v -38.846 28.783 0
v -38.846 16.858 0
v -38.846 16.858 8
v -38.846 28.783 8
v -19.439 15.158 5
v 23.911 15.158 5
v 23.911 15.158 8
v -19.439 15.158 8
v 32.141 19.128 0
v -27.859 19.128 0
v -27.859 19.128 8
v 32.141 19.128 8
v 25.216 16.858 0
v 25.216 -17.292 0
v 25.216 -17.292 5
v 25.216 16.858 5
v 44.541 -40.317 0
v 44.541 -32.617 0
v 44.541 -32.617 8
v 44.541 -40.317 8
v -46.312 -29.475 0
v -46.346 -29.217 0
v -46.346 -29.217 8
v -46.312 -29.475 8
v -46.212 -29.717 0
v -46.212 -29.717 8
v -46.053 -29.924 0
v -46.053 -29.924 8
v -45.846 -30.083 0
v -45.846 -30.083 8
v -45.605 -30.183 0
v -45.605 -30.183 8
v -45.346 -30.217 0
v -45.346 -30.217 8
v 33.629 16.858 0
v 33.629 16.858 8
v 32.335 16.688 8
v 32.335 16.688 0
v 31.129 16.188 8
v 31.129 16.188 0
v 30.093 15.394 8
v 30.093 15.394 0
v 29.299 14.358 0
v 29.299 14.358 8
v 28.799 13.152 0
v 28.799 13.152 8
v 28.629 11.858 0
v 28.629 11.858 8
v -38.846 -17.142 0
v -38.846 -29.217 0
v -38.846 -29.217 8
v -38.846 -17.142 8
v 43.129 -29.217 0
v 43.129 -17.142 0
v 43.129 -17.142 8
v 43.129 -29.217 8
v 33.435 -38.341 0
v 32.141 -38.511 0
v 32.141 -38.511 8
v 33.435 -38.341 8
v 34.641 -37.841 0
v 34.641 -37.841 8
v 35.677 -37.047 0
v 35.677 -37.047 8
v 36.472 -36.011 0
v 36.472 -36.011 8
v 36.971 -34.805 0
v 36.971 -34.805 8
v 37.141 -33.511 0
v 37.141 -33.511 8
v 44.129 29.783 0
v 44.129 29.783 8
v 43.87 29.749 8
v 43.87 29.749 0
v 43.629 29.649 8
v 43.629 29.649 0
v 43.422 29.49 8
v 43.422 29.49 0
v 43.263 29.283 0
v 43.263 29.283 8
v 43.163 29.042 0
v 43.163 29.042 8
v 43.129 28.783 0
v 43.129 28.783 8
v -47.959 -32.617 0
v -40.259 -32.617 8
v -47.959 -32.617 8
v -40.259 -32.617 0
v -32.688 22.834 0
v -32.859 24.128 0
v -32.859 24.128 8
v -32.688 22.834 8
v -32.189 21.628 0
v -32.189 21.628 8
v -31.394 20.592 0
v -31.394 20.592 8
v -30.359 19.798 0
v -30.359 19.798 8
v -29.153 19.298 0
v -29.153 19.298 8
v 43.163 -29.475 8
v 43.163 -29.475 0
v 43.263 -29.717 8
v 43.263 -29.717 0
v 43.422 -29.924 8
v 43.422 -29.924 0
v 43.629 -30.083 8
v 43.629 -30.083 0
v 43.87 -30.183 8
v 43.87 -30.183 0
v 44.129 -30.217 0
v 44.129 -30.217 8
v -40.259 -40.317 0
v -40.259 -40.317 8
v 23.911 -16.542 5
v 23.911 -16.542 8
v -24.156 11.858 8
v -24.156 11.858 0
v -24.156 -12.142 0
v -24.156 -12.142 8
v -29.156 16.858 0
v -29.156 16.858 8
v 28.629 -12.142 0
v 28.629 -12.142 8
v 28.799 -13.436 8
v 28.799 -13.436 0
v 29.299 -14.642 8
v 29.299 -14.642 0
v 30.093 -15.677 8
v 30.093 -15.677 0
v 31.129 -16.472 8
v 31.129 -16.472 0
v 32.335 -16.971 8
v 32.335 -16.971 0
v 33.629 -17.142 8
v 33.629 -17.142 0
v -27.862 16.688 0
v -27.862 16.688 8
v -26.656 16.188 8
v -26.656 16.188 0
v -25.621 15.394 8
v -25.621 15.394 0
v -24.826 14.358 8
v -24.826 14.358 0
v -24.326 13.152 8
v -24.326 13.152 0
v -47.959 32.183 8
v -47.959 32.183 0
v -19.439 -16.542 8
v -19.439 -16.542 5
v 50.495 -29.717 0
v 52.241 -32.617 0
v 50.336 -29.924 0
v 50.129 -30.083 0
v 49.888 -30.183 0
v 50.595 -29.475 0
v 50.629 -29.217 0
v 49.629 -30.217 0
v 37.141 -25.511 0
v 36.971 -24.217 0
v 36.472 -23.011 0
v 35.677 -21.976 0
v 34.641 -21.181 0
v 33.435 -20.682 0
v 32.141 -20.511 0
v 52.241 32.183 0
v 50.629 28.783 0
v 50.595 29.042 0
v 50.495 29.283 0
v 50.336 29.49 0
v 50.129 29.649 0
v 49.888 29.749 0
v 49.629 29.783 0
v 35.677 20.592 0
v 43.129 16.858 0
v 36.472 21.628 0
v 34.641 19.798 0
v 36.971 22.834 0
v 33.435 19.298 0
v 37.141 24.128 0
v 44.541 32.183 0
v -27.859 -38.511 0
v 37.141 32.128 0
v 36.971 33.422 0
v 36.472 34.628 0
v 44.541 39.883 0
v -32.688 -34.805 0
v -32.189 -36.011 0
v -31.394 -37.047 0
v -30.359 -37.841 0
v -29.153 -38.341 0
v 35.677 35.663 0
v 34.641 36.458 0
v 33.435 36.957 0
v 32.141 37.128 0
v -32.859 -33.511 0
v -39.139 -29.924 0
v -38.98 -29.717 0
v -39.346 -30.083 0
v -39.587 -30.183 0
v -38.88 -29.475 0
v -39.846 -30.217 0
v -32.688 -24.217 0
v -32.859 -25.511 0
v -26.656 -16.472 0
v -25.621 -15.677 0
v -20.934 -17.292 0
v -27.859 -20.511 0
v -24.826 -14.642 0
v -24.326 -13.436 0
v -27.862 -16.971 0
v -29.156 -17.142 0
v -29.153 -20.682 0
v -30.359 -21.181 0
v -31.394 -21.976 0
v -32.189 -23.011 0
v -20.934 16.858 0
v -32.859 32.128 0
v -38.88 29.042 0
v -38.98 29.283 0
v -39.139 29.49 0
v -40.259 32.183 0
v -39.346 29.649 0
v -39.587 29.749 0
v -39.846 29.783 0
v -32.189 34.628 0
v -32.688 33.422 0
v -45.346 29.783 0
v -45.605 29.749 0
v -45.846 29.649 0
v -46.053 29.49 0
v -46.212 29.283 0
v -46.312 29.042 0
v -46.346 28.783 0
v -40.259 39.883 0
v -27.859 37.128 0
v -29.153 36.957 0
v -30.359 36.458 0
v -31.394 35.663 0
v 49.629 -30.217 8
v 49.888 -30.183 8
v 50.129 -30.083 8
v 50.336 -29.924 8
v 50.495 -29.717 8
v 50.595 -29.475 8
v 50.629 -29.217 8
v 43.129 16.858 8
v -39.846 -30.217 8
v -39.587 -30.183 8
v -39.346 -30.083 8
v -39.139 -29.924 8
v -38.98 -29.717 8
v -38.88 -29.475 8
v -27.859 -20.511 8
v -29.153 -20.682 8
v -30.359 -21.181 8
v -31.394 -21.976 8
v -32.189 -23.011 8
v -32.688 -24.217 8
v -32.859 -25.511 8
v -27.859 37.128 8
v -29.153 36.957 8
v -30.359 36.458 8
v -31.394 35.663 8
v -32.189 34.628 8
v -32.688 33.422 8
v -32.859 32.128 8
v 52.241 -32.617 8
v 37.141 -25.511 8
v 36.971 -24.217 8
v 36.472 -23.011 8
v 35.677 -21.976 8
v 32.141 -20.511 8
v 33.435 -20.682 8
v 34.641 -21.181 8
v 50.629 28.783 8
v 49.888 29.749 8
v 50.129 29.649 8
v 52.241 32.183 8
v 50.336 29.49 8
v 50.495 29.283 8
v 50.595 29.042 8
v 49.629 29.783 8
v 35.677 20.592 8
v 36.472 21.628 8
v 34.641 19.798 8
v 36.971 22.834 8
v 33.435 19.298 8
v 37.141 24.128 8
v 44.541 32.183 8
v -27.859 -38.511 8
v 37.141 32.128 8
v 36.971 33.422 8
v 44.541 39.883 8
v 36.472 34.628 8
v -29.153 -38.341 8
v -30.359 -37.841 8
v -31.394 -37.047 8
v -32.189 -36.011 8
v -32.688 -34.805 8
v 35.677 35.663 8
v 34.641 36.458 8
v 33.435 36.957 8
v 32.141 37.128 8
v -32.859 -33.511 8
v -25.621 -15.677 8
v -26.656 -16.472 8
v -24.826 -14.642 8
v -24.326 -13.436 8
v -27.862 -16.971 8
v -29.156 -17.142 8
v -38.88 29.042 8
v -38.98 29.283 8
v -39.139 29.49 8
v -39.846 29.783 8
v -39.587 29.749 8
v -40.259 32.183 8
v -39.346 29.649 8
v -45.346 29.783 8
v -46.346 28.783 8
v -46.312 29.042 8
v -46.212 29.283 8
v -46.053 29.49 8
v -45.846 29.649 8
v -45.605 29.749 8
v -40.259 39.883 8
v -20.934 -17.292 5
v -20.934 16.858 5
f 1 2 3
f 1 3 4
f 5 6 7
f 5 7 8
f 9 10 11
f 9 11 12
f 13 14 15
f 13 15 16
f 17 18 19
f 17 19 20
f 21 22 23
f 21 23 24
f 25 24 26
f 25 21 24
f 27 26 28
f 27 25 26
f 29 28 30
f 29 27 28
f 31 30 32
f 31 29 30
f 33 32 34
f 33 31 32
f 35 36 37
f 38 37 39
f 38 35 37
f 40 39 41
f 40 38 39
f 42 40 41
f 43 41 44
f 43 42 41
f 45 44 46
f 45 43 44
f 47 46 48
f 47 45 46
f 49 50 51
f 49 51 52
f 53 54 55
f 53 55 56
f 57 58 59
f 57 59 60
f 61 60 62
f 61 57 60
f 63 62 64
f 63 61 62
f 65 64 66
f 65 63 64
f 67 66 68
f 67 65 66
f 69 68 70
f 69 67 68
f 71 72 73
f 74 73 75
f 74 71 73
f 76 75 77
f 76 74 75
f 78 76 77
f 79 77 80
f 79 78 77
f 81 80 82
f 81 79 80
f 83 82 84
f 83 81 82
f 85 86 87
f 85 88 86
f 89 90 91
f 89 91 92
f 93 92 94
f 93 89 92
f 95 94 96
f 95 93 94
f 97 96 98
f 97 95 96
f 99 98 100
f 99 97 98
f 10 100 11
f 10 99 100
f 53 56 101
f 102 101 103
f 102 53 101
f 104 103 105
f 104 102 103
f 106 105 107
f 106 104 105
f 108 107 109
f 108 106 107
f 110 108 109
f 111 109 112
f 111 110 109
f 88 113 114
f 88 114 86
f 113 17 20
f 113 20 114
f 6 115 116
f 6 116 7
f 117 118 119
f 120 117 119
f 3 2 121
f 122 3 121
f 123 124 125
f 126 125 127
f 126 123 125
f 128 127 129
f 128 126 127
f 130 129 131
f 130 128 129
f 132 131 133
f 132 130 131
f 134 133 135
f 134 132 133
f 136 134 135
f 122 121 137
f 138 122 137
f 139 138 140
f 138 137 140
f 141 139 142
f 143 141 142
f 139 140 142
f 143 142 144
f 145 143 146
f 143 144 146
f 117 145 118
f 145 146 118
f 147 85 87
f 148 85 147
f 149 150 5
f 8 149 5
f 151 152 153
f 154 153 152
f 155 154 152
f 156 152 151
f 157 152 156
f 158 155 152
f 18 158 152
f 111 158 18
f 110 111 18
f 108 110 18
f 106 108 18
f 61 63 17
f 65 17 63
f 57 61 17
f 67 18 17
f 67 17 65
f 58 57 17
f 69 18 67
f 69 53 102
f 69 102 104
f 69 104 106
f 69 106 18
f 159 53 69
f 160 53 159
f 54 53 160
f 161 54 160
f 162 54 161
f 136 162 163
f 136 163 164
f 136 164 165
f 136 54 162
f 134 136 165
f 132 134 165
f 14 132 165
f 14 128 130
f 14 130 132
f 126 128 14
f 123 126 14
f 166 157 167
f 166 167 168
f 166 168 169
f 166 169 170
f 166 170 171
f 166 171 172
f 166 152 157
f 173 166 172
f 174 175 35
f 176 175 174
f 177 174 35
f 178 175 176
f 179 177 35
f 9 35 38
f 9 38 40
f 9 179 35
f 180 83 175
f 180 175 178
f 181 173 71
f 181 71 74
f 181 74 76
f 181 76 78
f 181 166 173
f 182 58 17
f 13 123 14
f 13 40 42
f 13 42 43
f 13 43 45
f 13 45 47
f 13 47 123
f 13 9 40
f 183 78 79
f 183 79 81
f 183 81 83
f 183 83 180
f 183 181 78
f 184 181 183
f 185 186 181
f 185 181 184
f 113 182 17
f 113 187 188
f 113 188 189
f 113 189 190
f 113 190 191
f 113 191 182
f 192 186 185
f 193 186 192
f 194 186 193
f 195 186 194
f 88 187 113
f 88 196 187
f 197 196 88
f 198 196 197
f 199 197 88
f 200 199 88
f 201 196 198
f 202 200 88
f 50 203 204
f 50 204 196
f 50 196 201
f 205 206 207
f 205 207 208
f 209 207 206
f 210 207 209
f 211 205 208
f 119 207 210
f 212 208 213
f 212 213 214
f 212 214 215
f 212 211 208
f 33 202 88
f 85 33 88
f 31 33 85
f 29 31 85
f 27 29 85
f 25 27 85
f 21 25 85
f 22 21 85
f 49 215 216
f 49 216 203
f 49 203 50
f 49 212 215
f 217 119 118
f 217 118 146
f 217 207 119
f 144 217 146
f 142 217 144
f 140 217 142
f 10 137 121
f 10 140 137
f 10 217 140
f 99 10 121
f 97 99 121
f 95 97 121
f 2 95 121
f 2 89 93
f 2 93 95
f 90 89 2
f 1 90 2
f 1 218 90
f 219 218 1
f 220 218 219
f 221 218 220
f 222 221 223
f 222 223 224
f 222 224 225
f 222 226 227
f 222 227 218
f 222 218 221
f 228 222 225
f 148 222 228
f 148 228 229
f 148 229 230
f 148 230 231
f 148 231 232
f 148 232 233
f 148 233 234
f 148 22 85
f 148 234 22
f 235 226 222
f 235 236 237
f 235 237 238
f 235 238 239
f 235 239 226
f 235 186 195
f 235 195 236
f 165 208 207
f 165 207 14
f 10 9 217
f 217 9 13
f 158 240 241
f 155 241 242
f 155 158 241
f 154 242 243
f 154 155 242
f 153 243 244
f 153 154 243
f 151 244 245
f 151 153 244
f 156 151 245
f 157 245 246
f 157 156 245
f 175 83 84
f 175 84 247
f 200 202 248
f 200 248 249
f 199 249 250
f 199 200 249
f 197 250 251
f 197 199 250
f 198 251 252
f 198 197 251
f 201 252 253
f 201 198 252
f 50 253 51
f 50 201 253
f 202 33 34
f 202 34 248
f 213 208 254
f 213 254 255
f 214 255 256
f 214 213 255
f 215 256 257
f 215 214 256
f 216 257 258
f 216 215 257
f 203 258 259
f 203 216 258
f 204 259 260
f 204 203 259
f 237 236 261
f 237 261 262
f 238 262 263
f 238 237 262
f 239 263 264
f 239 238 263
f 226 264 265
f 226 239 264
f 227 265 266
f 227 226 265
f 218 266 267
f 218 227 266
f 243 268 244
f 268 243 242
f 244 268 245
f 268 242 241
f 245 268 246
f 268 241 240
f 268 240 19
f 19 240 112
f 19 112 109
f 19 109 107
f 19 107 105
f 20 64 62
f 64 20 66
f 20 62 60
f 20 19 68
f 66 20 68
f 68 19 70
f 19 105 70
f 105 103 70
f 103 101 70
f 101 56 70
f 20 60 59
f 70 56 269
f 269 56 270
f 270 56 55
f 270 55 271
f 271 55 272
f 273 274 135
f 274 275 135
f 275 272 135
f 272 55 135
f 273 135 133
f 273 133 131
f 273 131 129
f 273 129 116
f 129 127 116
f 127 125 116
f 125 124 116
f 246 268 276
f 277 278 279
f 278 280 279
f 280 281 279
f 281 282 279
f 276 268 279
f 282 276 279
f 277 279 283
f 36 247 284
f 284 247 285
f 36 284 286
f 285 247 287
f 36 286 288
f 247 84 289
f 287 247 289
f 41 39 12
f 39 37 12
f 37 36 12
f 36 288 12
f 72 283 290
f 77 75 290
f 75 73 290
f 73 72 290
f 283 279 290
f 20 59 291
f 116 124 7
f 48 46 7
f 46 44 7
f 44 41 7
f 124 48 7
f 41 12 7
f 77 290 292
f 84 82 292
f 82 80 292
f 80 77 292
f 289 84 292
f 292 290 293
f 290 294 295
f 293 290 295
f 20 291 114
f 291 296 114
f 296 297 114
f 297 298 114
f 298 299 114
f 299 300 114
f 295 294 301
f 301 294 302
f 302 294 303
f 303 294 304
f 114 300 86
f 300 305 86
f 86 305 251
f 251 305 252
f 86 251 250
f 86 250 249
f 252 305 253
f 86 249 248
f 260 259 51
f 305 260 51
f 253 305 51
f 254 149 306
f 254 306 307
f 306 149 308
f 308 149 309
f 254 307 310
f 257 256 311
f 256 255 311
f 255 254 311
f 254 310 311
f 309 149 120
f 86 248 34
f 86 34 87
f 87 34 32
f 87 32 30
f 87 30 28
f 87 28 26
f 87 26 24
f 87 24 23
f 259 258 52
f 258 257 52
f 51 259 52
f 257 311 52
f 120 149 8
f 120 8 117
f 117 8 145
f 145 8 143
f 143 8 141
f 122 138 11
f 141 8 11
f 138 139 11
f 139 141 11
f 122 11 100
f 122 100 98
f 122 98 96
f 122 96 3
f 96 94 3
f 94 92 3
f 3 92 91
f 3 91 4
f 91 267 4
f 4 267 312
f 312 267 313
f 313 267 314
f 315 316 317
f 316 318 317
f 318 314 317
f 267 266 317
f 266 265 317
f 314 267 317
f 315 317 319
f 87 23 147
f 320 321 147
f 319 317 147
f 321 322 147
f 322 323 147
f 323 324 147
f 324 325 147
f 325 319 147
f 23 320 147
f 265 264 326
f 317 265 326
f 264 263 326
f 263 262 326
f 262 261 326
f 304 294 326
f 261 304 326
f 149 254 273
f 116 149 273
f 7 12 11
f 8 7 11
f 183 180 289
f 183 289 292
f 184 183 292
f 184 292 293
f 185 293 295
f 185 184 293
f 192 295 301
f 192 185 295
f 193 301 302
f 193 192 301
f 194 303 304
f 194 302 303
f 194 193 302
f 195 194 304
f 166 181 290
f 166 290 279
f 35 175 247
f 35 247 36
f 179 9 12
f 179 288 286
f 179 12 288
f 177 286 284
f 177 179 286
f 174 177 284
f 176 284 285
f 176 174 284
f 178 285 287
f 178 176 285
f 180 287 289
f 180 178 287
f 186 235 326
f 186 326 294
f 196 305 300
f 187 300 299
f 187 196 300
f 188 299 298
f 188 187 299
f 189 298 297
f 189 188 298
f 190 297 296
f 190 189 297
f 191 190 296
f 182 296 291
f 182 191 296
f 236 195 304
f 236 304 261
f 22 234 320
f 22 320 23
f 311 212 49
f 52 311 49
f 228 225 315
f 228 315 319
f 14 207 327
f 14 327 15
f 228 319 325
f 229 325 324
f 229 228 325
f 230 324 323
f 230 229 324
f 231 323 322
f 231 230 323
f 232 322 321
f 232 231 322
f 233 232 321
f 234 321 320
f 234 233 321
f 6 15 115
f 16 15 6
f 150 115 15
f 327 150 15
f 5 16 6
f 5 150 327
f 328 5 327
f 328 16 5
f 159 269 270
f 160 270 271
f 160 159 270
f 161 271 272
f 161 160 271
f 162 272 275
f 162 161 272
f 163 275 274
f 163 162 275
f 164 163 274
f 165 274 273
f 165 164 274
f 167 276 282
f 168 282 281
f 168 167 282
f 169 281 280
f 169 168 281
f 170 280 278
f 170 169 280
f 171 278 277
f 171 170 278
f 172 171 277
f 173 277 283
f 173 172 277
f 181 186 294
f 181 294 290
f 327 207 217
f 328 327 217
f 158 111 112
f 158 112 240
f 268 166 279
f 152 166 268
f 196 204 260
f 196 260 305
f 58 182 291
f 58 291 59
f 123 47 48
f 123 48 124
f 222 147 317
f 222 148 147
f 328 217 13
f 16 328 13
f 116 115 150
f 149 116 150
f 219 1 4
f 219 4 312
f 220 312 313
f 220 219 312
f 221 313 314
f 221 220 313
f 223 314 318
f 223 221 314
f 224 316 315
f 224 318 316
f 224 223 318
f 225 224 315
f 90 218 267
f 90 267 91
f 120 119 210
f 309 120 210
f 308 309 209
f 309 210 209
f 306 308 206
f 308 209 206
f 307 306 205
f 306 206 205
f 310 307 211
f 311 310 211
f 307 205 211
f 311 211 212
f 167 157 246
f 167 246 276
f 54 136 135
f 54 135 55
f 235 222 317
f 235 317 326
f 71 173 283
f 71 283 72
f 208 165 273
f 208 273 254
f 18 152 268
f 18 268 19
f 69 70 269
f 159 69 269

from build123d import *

# Parameters (mm, degrees)
ESQUISSE1_W             = 46.15
ESQUISSE1_H             = 34.15
BOSS_EXTRU_1_DEPTH      = 5
BOSS_EXTRU_2_DEPTH      = 3
ENL_V_MAT_EXTRU_4_DEPTH = 9
ESQUISSE7_W             = 43.35
ESQUISSE7_H             = 31.7
ENL_V_MAT_EXTRU_5_DEPTH = 7
ENL_V_MAT_EXTRU_6_DEPTH = 9


with BuildPart() as part:
    # Esquisse1 → Boss.-Extru.1 (new body)
    with BuildSketch(Plane.XY):
        Polygon((-40.258600608, 39.883341456), (44.541399392, 39.883341456), (44.541399392, 32.183341456), (52.241399392, 32.183341456), (52.241399392, -32.616658544), (44.541399392, -32.616658544), (44.541399392, -40.316658544), (-40.258600608, -40.316658544), (-40.258600608, -32.616658544), (-47.958600608, -32.616658544), (-47.958600608, 32.183341456), (-40.258600608, 32.183341456), align=None)
        with Locations((2.141399392, -0.216658544)):
            Rectangle(ESQUISSE1_W, ESQUISSE1_H, mode=Mode.SUBTRACT)
    extrude(amount=BOSS_EXTRU_1_DEPTH)

    # Esquisse2 → Boss.-Extru.2 (add)
    with BuildSketch(Plane.XY.offset(5)):
        Polygon((-47.958600608, 32.183341456), (-40.258600608, 32.183341456), (-40.258600608, 39.883341456), (44.541399392, 39.883341456), (44.541399392, 32.183341456), (52.241399392, 32.183341456), (52.241399392, -32.616658544), (44.541399392, -32.616658544), (44.541399392, -40.316658544), (-40.258600608, -40.316658544), (-40.258600608, -32.616658544), (-47.958600608, -32.616658544), align=None)
    extrude(amount=BOSS_EXTRU_2_DEPTH)

    # Esquisse6 → Enlèv. mat.-Extru.4 (cut, through all)
    with BuildSketch(Plane(origin=(0, 0, 0), x_dir=(-1, 0, 0), z_dir=(0, 0, -1))):
        with BuildLine():
            Line((-49.628899392, 29.783341456), (-44.128899392, 29.783341456))
            ThreePointArc((-44.128899392, 29.783341456), (-43.421792611, 29.490448238), (-43.128899392, 28.783341456))
            Line((-43.128899392, 28.783341456), (-43.128899392, -29.216658544))
            ThreePointArc((-43.128899392, -29.216658544), (-43.421792611, -29.923765325), (-44.128899392, -30.216658544))
            Line((-44.128899392, -30.216658544), (-49.628899392, -30.216658544))
            ThreePointArc((-49.628899392, -30.216658544), (-50.336006173, -29.923765325), (-50.628899392, -29.216658544))
            Line((-50.628899392, -29.216658544), (-50.628899392, 28.783341456))
            ThreePointArc((-50.628899392, 28.783341456), (-50.336006173, 29.490448238), (-49.628899392, 29.783341456))
        make_face()
        with BuildLine():
            Line((45.346100608, -30.216658544), (39.846100608, -30.216658544))
            ThreePointArc((39.846100608, -30.216658544), (39.138993827, -29.923765325), (38.846100608, -29.216658544))
            Line((38.846100608, -29.216658544), (38.846100608, 28.783341456))
            ThreePointArc((38.846100608, 28.783341456), (39.138993827, 29.490448238), (39.846100608, 29.783341456))
            Line((39.846100608, 29.783341456), (45.346100608, 29.783341456))
            ThreePointArc((45.346100608, 29.783341456), (46.053207389, 29.490448238), (46.346100608, 28.783341456))
            Line((46.346100608, 28.783341456), (46.346100608, -29.216658544))
            ThreePointArc((46.346100608, -29.216658544), (46.053207389, -29.923765325), (45.346100608, -30.216658544))
        make_face()
    extrude(amount=-ENL_V_MAT_EXTRU_4_DEPTH, mode=Mode.SUBTRACT)

    # Esquisse7 → Enlèv. mat.-Extru.5 (cut)
    with BuildSketch(Plane(origin=(0, 0, 5), x_dir=(-1, 0, 0), z_dir=(0, 0, -1))):
        with Locations((-2.236399392, -0.691658544)):
            Rectangle(ESQUISSE7_W, ESQUISSE7_H)
    extrude(amount=-ENL_V_MAT_EXTRU_5_DEPTH, mode=Mode.SUBTRACT)

    # Esquisse8 → Enlèv. mat.-Extru.6 (cut, through all)
    with BuildSketch(Plane(origin=(0, 0, 0), x_dir=(-1, 0, 0), z_dir=(0, 0, -1))):
        with BuildLine():
            Line((-32.141399392, 37.127856995), (27.858600608, 37.127856995))
            ThreePointArc((27.858600608, 37.127856995), (31.394134514, 35.663390901), (32.858600608, 32.127856995))
            Line((32.858600608, 32.127856995), (32.858600608, 24.127856995))
            ThreePointArc((32.858600608, 24.127856995), (31.394134514, 20.592323089), (27.858600608, 19.127856995))
            Line((27.858600608, 19.127856995), (-32.141399392, 19.127856995))
            ThreePointArc((-32.141399392, 19.127856995), (-35.676933298, 20.592323089), (-37.141399392, 24.127856995))
            Line((-37.141399392, 24.127856995), (-37.141399392, 32.127856995))
            ThreePointArc((-37.141399392, 32.127856995), (-35.676933298, 35.663390901), (-32.141399392, 37.127856995))
        make_face()
        with BuildLine():
            Line((-32.141399392, -20.511174082), (27.858600608, -20.511174082))
            ThreePointArc((27.858600608, -20.511174082), (31.394134514, -21.975640176), (32.858600608, -25.511174082))
            Line((32.858600608, -25.511174082), (32.858600608, -33.511174082))
            ThreePointArc((32.858600608, -33.511174082), (31.394134514, -37.046707988), (27.858600608, -38.511174082))
            Line((27.858600608, -38.511174082), (-32.141399392, -38.511174082))
            ThreePointArc((-32.141399392, -38.511174082), (-35.676933298, -37.046707988), (-37.141399392, -33.511174082))
            Line((-37.141399392, -33.511174082), (-37.141399392, -25.511174082))
            ThreePointArc((-37.141399392, -25.511174082), (-35.676933298, -21.975640176), (-32.141399392, -20.511174082))
        make_face()
        with BuildLine():
            Line((-43.128899392, 16.858341456), (-33.628899392, 16.858341456))
            ThreePointArc((-33.628899392, 16.858341456), (-30.093365486, 15.393875362), (-28.628899392, 11.858341456))
            Line((-28.628899392, 11.858341456), (-28.628899392, -12.141658544))
            ThreePointArc((-28.628899392, -12.141658544), (-30.093365486, -15.677192449), (-33.628899392, -17.141658544))
            Line((-33.628899392, -17.141658544), (-45.647019221, -17.141658544))
            Line((-45.647019221, -17.141658544), (-45.647019221, 16.858341456))
            Line((-45.647019221, 16.858341456), (-43.128899392, 16.858341456))
        make_face()
        with BuildLine():
            Line((41.174220437, -17.141658544), (41.174220437, 16.858341456))
            Line((41.174220437, 16.858341456), (38.656100608, 16.858341456))
            Line((38.656100608, 16.858341456), (29.156100608, 16.858341456))
            ThreePointArc((29.156100608, 16.858341456), (25.620566702, 15.393875362), (24.156100608, 11.858341456))
            Line((24.156100608, 11.858341456), (24.156100608, -12.141658544))
            ThreePointArc((24.156100608, -12.141658544), (25.620566702, -15.677192449), (29.156100608, -17.141658544))
            Line((29.156100608, -17.141658544), (41.174220437, -17.141658544))
        make_face()
    extrude(amount=-ENL_V_MAT_EXTRU_6_DEPTH, mode=Mode.SUBTRACT)


solid = part.part
